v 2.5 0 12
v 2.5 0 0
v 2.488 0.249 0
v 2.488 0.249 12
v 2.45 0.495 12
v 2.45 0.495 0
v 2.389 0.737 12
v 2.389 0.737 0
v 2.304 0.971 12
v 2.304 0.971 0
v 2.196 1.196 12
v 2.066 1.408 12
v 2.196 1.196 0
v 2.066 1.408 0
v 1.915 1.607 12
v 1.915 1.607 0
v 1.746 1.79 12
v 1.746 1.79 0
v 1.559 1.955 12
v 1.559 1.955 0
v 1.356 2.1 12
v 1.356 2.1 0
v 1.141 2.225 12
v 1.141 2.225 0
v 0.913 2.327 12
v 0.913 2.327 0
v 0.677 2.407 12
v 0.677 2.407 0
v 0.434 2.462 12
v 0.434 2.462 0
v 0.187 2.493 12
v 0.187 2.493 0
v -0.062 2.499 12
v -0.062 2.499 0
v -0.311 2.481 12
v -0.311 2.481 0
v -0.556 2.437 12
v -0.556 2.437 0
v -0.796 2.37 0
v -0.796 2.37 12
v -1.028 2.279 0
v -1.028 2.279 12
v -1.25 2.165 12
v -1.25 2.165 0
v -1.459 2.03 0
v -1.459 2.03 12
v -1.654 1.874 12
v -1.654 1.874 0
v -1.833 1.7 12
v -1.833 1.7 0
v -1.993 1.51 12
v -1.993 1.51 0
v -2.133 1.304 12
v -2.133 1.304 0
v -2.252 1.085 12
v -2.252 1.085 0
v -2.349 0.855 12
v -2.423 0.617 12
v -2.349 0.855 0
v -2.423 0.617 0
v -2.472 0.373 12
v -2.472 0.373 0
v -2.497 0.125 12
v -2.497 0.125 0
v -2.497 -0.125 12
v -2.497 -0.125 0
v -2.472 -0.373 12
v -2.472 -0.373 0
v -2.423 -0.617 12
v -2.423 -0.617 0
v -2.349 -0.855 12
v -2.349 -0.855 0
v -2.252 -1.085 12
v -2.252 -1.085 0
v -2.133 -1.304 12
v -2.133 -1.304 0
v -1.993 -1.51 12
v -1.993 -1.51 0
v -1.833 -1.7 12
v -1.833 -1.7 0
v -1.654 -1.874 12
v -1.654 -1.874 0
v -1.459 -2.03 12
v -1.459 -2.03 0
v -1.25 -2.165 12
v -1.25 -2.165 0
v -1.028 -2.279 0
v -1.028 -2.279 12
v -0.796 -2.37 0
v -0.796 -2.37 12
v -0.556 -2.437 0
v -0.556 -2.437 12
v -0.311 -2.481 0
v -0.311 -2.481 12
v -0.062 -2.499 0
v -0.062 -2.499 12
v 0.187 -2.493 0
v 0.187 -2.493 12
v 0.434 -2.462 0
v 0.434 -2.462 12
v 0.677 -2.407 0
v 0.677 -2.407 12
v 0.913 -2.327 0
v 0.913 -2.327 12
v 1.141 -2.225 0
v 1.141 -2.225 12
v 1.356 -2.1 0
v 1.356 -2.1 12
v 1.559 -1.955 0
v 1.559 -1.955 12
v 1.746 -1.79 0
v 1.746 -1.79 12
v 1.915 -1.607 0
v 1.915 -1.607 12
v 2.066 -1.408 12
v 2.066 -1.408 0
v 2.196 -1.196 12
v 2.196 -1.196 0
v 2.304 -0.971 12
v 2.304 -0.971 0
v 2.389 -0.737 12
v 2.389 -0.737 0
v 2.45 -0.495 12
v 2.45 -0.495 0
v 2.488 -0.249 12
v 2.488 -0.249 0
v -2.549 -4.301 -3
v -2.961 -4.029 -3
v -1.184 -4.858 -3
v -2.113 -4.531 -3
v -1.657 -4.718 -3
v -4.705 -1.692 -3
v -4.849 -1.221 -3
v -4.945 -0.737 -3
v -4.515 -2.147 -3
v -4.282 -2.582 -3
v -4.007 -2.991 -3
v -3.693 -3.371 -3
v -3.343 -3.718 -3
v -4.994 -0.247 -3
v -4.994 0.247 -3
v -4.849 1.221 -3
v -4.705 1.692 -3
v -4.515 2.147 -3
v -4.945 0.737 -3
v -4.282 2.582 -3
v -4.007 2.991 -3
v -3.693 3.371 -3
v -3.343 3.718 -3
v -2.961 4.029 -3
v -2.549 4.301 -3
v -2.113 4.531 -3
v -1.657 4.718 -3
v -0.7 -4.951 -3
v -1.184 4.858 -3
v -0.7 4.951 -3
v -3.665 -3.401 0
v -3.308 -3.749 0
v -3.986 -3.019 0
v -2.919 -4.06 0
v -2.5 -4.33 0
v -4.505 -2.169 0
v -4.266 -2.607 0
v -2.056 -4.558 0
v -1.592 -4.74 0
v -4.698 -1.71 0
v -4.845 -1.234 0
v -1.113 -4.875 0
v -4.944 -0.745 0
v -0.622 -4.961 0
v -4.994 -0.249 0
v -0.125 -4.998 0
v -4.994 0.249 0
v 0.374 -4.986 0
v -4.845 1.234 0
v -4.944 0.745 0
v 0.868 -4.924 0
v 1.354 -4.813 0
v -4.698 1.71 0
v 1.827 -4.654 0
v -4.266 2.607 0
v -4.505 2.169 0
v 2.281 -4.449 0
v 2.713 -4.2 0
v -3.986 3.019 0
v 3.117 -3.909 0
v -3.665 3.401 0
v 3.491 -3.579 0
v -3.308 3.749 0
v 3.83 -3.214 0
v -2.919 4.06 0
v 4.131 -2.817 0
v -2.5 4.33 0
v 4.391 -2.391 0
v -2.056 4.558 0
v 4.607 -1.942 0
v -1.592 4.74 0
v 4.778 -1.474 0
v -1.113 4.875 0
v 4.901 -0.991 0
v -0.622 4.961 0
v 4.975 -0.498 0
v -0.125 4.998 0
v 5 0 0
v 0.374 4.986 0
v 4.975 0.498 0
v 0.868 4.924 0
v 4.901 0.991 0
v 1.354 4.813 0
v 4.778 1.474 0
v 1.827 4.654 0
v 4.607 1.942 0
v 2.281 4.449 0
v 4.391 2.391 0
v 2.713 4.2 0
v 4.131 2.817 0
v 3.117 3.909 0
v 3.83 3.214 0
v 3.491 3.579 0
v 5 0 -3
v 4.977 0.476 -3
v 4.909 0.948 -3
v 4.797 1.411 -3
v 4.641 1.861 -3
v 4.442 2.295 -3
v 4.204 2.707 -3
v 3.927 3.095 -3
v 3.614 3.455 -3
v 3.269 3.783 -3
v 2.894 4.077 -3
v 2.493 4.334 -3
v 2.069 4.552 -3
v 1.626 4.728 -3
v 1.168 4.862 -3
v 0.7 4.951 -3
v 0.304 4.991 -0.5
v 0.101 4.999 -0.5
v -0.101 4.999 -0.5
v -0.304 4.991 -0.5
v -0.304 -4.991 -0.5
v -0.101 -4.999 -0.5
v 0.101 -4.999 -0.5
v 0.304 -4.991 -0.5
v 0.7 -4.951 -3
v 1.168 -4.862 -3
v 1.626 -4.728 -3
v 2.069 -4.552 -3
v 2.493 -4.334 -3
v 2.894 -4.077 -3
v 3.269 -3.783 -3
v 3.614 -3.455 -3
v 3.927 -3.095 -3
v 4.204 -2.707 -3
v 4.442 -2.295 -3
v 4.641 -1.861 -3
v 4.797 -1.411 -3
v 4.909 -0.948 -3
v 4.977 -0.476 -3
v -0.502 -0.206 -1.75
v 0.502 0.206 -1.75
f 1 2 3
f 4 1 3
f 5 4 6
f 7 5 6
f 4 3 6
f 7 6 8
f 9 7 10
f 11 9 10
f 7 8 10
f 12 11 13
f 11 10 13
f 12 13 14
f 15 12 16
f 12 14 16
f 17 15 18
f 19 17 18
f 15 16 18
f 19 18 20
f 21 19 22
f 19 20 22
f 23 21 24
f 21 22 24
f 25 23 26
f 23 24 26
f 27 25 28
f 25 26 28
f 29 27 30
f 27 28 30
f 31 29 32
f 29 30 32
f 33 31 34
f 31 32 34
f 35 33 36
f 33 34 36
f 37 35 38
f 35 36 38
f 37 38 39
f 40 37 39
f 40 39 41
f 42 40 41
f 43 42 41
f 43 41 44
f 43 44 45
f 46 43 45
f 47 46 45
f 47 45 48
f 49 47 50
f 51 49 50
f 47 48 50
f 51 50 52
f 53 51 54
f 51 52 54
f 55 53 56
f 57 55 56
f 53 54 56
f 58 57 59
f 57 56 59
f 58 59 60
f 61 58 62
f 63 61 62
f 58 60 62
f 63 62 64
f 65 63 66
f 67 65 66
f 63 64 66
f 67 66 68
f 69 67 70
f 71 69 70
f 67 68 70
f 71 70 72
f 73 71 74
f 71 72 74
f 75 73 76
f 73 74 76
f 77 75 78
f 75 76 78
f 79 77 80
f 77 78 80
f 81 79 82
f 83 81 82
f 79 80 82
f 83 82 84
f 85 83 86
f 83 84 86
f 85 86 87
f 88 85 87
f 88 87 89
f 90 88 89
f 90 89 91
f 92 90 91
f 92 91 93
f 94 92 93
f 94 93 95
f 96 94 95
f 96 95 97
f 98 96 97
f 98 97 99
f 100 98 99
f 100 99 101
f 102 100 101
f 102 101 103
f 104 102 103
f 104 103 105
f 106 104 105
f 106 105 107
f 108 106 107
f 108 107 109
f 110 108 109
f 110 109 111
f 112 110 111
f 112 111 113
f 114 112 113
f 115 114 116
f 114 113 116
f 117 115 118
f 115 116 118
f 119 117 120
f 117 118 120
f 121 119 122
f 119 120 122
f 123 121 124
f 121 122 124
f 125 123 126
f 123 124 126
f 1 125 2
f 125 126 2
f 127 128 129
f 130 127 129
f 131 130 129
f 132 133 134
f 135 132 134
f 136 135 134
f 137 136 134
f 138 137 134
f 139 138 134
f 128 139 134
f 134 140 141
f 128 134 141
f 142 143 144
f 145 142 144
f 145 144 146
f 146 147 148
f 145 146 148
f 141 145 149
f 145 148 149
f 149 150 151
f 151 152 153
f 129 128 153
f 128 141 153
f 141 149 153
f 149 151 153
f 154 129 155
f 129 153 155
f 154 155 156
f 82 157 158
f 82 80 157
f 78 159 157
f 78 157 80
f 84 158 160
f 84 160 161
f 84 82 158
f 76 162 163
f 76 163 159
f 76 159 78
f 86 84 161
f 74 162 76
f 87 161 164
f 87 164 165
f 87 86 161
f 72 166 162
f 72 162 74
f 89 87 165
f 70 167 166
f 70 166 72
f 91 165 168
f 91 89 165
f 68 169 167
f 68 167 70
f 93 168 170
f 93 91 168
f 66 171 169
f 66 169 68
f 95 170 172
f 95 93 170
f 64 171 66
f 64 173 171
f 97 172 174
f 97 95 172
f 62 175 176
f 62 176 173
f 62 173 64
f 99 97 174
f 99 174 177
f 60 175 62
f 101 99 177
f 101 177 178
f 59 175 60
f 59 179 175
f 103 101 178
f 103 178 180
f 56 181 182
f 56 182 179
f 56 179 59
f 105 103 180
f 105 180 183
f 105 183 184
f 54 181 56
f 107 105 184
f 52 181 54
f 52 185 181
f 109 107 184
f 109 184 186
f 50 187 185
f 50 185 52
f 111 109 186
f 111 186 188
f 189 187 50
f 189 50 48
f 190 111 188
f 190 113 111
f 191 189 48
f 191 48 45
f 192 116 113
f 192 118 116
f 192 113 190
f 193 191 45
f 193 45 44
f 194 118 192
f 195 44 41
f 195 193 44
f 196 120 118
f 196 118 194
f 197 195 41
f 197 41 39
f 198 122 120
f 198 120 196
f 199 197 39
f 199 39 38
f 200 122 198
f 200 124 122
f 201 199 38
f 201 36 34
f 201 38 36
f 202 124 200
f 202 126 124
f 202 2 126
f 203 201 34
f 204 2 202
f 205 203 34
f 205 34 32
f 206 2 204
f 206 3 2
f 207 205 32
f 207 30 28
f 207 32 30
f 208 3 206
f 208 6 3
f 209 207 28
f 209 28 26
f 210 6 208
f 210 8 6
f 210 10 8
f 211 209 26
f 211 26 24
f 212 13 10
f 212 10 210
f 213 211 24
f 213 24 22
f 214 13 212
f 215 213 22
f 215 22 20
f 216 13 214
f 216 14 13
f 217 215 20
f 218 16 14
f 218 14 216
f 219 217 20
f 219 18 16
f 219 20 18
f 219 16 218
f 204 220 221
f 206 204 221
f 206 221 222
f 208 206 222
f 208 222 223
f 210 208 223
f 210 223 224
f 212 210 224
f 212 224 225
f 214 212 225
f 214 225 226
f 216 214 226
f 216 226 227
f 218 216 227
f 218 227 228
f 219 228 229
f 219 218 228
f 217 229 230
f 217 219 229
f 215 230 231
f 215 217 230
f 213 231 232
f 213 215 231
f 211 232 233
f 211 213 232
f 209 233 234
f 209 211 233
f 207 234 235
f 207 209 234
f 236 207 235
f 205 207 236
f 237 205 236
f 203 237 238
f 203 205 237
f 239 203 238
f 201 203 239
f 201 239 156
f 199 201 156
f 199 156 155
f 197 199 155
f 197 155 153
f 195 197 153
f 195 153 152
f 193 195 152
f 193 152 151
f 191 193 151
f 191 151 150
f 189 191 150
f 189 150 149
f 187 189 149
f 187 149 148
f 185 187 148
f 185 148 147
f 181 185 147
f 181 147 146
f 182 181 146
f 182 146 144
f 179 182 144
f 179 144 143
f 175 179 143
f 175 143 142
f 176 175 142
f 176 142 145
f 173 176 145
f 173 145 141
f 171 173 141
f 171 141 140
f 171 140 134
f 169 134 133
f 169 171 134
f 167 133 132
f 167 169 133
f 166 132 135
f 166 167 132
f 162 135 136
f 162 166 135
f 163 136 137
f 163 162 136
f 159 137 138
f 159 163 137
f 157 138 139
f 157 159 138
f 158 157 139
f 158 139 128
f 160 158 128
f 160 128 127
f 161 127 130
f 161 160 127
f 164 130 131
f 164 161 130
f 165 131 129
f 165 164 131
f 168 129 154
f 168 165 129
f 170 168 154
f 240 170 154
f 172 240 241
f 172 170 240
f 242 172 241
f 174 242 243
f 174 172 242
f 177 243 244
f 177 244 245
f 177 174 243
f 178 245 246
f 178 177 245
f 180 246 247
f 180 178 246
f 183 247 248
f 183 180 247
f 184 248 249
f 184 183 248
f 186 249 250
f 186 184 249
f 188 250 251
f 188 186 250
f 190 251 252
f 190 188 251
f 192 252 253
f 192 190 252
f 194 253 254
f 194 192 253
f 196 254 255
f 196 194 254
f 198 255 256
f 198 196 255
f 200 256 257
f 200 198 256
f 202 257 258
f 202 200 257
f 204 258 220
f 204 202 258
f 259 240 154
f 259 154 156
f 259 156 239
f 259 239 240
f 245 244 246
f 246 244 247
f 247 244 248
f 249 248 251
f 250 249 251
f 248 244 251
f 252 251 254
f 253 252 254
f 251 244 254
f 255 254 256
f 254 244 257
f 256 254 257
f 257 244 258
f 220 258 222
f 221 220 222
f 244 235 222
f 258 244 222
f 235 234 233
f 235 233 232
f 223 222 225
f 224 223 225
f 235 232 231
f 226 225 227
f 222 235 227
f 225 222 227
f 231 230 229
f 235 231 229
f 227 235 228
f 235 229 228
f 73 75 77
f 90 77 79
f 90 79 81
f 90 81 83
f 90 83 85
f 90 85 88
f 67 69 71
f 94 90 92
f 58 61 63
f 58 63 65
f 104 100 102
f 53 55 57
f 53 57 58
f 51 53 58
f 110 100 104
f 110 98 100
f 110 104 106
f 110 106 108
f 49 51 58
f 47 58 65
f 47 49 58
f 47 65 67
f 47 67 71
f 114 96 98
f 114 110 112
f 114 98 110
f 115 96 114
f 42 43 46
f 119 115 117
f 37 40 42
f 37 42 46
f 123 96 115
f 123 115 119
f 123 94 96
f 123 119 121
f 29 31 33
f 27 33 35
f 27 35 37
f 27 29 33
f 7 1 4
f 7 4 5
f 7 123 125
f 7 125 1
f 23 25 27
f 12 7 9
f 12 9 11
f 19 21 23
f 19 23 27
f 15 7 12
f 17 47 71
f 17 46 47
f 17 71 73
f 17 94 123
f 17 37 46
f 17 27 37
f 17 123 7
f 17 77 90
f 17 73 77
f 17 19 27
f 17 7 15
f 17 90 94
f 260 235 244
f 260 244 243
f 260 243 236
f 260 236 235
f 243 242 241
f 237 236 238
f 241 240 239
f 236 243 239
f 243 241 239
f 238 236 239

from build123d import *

# Parameters (mm, degrees)
CROQUIS1_R              = 2.5
SALIENTE_EXTRUIR1_DEPTH = 12
CROQUIS2_R              = 5
SALIENTE_EXTRUIR2_DEPTH = 3
CROQUIS3_W              = 1.4
CROQUIS3_H              = 11
CORTAR_EXTRUIR2_DEPTH   = 2.5
CORTAR_EXTRUIR2_TAPER   = 9


with BuildPart() as part:
    # Croquis1 → Saliente-Extruir1 (new body)
    with BuildSketch(Plane.XY):
        Circle(CROQUIS1_R)
    extrude(amount=SALIENTE_EXTRUIR1_DEPTH)

    # Croquis2 → Saliente-Extruir2 (add)
    with BuildSketch(Plane.XY):
        Circle(CROQUIS2_R)
    extrude(amount=-SALIENTE_EXTRUIR2_DEPTH)

    # Croquis3 → Cortar-Extruir2 (cut)
    with BuildSketch(Plane(origin=(0, 0, -3), x_dir=(-1, 0, 0), z_dir=(0, 0, -1))):
        Rectangle(CROQUIS3_W, CROQUIS3_H)
    extrude(amount=-CORTAR_EXTRUIR2_DEPTH, taper=CORTAR_EXTRUIR2_TAPER, mode=Mode.SUBTRACT)


solid = part.part
